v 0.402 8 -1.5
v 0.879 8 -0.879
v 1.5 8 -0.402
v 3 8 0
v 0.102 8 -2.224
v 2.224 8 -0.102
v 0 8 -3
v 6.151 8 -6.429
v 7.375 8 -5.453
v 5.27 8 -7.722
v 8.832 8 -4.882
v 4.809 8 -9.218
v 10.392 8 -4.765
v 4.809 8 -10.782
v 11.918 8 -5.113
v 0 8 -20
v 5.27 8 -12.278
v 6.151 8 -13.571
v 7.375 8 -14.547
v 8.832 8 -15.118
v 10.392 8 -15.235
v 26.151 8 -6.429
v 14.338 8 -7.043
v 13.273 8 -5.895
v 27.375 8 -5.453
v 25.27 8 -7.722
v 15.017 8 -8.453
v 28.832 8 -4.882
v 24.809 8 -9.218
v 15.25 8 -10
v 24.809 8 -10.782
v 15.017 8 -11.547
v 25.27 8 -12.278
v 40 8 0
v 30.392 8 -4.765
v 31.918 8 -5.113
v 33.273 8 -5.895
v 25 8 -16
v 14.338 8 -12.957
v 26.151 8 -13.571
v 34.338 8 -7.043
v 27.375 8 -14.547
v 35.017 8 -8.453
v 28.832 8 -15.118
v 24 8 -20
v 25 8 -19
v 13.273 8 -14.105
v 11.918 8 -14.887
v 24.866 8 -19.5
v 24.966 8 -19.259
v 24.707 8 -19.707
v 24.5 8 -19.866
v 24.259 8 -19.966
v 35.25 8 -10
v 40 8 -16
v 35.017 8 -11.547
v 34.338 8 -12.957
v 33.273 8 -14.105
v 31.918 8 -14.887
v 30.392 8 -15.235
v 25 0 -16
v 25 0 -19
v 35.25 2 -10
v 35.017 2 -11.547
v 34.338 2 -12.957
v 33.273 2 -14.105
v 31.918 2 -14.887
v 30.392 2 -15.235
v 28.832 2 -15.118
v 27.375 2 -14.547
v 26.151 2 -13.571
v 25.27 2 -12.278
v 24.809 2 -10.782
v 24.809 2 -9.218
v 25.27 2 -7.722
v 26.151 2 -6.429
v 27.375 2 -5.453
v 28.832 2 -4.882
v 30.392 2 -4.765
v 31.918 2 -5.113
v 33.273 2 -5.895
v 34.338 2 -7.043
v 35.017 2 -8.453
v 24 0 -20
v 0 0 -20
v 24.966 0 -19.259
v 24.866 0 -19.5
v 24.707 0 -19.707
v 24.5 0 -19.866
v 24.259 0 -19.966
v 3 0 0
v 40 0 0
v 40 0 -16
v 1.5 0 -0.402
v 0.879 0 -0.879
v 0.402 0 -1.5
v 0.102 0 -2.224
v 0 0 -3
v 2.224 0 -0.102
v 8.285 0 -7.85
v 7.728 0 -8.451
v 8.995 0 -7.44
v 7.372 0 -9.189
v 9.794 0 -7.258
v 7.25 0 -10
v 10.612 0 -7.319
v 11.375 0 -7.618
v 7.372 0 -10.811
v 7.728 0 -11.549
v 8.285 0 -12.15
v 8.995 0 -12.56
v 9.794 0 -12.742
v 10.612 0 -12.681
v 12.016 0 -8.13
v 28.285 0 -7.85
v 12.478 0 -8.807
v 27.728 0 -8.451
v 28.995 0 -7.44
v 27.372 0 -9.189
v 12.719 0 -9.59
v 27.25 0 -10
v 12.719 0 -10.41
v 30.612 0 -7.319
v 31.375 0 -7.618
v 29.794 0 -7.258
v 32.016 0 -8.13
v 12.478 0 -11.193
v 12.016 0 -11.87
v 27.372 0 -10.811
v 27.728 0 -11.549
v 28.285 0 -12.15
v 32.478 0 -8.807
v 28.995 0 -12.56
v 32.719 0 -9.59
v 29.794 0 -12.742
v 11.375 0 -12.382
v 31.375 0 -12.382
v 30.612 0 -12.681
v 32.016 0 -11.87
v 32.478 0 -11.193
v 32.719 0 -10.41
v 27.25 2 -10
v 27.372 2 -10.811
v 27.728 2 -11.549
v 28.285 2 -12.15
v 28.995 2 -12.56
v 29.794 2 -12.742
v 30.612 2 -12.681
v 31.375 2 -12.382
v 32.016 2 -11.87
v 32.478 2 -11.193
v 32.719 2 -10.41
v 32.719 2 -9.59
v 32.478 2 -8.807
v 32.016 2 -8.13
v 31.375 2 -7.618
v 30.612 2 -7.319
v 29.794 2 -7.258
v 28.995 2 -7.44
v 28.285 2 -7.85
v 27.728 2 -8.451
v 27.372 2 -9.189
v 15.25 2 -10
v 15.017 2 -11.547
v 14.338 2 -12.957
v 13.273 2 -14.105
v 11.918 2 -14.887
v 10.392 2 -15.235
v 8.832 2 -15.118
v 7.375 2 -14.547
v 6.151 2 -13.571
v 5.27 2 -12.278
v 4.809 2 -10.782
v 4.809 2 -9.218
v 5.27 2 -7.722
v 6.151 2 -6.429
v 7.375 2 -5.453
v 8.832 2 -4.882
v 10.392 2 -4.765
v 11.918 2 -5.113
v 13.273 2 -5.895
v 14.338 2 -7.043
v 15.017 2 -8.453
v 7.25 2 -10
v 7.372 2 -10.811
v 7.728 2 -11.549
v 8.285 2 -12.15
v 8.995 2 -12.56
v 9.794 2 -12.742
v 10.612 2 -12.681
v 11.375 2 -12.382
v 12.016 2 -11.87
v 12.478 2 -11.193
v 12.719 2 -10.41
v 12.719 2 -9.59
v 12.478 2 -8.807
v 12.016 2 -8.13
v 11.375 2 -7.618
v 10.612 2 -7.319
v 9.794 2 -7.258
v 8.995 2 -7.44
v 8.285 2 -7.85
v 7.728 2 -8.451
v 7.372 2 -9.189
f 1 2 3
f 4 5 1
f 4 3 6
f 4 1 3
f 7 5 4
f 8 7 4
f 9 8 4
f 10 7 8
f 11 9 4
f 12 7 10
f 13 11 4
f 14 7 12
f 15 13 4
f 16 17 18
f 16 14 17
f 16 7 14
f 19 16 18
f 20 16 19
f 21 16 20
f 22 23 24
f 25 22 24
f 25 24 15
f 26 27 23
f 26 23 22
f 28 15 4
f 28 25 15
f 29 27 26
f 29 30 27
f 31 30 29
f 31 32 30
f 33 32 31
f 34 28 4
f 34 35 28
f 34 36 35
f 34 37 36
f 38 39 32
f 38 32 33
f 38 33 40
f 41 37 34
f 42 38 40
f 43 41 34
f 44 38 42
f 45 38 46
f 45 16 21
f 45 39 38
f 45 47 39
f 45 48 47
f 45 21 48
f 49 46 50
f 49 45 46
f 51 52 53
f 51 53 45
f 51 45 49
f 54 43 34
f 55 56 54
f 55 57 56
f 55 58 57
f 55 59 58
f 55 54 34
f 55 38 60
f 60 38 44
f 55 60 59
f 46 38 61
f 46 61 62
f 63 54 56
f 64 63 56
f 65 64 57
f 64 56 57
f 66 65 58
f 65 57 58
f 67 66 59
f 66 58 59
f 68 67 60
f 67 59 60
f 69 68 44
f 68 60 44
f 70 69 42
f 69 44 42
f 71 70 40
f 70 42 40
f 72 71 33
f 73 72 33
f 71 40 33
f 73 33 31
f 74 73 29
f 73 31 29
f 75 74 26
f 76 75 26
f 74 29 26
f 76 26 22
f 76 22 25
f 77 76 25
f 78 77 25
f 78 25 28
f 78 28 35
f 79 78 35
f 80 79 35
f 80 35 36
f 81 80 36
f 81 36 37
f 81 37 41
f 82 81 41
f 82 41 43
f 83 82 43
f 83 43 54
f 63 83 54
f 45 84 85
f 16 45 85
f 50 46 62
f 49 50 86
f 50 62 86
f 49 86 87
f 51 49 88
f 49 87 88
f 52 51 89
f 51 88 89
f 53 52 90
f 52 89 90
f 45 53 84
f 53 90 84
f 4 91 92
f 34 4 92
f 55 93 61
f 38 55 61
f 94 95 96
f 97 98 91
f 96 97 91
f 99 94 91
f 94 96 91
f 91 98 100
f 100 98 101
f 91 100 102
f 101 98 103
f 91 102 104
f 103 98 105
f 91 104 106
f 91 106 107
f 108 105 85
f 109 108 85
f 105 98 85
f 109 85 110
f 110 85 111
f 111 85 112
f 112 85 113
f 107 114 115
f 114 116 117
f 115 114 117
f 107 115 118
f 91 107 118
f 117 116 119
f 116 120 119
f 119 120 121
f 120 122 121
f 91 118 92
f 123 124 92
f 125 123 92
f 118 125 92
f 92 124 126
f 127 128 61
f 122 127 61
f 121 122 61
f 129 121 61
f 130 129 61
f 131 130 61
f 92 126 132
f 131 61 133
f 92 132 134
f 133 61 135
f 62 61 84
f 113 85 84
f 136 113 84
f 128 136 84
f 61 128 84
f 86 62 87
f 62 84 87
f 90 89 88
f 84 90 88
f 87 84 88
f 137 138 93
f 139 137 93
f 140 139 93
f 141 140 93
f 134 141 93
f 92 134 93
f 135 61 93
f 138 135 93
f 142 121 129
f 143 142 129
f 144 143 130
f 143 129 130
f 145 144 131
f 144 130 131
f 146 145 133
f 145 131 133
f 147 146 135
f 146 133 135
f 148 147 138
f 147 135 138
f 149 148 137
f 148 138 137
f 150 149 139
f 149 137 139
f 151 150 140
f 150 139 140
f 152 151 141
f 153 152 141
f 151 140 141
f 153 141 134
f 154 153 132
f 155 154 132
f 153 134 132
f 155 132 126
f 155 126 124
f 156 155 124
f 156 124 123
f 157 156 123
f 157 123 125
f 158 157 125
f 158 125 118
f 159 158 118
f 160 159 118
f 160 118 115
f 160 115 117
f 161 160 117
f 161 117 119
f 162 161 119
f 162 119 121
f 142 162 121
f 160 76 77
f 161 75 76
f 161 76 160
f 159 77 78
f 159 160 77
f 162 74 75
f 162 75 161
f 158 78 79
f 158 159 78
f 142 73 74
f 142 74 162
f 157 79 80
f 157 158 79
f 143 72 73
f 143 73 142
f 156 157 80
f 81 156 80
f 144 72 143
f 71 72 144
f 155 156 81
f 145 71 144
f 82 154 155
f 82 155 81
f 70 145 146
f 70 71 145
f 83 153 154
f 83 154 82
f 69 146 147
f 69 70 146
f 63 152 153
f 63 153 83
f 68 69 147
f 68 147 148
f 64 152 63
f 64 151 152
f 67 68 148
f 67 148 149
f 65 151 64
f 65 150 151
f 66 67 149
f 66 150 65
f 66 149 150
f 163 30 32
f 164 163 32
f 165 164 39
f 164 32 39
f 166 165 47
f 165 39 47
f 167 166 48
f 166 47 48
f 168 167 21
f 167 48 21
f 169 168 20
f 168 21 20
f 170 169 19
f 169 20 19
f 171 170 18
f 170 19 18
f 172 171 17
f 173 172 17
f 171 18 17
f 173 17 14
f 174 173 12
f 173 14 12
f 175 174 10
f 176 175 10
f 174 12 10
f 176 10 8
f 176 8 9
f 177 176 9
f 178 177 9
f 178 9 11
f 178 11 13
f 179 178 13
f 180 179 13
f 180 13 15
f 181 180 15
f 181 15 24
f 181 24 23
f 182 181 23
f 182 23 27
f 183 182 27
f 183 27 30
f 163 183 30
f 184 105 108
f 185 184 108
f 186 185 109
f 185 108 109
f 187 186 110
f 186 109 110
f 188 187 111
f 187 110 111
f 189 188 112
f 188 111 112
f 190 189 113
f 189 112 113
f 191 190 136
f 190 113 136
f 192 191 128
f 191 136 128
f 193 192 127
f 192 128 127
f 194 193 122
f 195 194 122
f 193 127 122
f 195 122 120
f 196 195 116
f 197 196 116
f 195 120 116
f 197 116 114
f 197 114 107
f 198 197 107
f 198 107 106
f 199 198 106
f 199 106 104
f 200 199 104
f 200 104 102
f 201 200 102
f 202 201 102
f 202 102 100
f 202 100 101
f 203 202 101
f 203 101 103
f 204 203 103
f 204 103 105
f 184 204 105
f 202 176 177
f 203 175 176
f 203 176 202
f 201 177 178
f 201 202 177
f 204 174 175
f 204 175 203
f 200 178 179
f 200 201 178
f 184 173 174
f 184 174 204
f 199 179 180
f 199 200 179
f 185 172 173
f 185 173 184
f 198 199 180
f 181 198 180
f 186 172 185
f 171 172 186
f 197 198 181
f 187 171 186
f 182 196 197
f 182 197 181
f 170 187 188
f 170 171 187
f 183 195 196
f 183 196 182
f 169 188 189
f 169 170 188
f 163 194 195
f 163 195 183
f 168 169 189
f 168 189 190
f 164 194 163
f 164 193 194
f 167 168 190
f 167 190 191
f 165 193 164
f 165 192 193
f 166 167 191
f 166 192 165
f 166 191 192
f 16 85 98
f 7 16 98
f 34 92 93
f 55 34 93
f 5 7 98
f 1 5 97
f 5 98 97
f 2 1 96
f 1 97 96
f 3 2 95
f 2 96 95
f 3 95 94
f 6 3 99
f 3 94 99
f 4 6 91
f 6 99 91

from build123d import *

# Parameters (mm, degrees)
BOSS_EXTRUDE1_DEPTH            = 8
CBORE_FOR_M5_SHCS1_D           = 5.5
CBORE_FOR_M5_SHCS1_DEPTH       = 8
CBORE_FOR_M5_SHCS1_CBORE_D     = 10.5
CBORE_FOR_M5_SHCS1_CBORE_DEPTH = 6


with BuildPart() as part:
    # Sketch1 → Boss-Extrude1 (new body)
    with BuildSketch(Plane(origin=(0, 0, 0), x_dir=(1, 0, 0), z_dir=(0, 1, 0))):
        with BuildLine():
            Line((3, 0), (37, 0))
            Line((37, 0), (40, 0))
            Line((40, 0), (40, 3))
            Line((40, 3), (40, 16))
            Line((40, 16), (25, 16))
            Line((25, 16), (25, 19))
            ThreePointArc((25, 19), (24.707106781, 19.707106781), (24, 20))
            Line((24, 20), (0, 20))
            Line((0, 20), (0, 3))
            ThreePointArc((0, 3), (0.878679656, 0.878679656), (3, 0))
        make_face()
    extrude(amount=BOSS_EXTRUDE1_DEPTH)

    # CBORE for M5 SHCS1
    with Locations(Plane(origin=(0, 8, 0), x_dir=(1, 0, 0), z_dir=(0, 1, 0))):
        with Locations((30, 10), (10, 10)):
            CounterBoreHole(CBORE_FOR_M5_SHCS1_D / 2, CBORE_FOR_M5_SHCS1_CBORE_D / 2, CBORE_FOR_M5_SHCS1_CBORE_DEPTH, depth=CBORE_FOR_M5_SHCS1_DEPTH)


solid = part.part
